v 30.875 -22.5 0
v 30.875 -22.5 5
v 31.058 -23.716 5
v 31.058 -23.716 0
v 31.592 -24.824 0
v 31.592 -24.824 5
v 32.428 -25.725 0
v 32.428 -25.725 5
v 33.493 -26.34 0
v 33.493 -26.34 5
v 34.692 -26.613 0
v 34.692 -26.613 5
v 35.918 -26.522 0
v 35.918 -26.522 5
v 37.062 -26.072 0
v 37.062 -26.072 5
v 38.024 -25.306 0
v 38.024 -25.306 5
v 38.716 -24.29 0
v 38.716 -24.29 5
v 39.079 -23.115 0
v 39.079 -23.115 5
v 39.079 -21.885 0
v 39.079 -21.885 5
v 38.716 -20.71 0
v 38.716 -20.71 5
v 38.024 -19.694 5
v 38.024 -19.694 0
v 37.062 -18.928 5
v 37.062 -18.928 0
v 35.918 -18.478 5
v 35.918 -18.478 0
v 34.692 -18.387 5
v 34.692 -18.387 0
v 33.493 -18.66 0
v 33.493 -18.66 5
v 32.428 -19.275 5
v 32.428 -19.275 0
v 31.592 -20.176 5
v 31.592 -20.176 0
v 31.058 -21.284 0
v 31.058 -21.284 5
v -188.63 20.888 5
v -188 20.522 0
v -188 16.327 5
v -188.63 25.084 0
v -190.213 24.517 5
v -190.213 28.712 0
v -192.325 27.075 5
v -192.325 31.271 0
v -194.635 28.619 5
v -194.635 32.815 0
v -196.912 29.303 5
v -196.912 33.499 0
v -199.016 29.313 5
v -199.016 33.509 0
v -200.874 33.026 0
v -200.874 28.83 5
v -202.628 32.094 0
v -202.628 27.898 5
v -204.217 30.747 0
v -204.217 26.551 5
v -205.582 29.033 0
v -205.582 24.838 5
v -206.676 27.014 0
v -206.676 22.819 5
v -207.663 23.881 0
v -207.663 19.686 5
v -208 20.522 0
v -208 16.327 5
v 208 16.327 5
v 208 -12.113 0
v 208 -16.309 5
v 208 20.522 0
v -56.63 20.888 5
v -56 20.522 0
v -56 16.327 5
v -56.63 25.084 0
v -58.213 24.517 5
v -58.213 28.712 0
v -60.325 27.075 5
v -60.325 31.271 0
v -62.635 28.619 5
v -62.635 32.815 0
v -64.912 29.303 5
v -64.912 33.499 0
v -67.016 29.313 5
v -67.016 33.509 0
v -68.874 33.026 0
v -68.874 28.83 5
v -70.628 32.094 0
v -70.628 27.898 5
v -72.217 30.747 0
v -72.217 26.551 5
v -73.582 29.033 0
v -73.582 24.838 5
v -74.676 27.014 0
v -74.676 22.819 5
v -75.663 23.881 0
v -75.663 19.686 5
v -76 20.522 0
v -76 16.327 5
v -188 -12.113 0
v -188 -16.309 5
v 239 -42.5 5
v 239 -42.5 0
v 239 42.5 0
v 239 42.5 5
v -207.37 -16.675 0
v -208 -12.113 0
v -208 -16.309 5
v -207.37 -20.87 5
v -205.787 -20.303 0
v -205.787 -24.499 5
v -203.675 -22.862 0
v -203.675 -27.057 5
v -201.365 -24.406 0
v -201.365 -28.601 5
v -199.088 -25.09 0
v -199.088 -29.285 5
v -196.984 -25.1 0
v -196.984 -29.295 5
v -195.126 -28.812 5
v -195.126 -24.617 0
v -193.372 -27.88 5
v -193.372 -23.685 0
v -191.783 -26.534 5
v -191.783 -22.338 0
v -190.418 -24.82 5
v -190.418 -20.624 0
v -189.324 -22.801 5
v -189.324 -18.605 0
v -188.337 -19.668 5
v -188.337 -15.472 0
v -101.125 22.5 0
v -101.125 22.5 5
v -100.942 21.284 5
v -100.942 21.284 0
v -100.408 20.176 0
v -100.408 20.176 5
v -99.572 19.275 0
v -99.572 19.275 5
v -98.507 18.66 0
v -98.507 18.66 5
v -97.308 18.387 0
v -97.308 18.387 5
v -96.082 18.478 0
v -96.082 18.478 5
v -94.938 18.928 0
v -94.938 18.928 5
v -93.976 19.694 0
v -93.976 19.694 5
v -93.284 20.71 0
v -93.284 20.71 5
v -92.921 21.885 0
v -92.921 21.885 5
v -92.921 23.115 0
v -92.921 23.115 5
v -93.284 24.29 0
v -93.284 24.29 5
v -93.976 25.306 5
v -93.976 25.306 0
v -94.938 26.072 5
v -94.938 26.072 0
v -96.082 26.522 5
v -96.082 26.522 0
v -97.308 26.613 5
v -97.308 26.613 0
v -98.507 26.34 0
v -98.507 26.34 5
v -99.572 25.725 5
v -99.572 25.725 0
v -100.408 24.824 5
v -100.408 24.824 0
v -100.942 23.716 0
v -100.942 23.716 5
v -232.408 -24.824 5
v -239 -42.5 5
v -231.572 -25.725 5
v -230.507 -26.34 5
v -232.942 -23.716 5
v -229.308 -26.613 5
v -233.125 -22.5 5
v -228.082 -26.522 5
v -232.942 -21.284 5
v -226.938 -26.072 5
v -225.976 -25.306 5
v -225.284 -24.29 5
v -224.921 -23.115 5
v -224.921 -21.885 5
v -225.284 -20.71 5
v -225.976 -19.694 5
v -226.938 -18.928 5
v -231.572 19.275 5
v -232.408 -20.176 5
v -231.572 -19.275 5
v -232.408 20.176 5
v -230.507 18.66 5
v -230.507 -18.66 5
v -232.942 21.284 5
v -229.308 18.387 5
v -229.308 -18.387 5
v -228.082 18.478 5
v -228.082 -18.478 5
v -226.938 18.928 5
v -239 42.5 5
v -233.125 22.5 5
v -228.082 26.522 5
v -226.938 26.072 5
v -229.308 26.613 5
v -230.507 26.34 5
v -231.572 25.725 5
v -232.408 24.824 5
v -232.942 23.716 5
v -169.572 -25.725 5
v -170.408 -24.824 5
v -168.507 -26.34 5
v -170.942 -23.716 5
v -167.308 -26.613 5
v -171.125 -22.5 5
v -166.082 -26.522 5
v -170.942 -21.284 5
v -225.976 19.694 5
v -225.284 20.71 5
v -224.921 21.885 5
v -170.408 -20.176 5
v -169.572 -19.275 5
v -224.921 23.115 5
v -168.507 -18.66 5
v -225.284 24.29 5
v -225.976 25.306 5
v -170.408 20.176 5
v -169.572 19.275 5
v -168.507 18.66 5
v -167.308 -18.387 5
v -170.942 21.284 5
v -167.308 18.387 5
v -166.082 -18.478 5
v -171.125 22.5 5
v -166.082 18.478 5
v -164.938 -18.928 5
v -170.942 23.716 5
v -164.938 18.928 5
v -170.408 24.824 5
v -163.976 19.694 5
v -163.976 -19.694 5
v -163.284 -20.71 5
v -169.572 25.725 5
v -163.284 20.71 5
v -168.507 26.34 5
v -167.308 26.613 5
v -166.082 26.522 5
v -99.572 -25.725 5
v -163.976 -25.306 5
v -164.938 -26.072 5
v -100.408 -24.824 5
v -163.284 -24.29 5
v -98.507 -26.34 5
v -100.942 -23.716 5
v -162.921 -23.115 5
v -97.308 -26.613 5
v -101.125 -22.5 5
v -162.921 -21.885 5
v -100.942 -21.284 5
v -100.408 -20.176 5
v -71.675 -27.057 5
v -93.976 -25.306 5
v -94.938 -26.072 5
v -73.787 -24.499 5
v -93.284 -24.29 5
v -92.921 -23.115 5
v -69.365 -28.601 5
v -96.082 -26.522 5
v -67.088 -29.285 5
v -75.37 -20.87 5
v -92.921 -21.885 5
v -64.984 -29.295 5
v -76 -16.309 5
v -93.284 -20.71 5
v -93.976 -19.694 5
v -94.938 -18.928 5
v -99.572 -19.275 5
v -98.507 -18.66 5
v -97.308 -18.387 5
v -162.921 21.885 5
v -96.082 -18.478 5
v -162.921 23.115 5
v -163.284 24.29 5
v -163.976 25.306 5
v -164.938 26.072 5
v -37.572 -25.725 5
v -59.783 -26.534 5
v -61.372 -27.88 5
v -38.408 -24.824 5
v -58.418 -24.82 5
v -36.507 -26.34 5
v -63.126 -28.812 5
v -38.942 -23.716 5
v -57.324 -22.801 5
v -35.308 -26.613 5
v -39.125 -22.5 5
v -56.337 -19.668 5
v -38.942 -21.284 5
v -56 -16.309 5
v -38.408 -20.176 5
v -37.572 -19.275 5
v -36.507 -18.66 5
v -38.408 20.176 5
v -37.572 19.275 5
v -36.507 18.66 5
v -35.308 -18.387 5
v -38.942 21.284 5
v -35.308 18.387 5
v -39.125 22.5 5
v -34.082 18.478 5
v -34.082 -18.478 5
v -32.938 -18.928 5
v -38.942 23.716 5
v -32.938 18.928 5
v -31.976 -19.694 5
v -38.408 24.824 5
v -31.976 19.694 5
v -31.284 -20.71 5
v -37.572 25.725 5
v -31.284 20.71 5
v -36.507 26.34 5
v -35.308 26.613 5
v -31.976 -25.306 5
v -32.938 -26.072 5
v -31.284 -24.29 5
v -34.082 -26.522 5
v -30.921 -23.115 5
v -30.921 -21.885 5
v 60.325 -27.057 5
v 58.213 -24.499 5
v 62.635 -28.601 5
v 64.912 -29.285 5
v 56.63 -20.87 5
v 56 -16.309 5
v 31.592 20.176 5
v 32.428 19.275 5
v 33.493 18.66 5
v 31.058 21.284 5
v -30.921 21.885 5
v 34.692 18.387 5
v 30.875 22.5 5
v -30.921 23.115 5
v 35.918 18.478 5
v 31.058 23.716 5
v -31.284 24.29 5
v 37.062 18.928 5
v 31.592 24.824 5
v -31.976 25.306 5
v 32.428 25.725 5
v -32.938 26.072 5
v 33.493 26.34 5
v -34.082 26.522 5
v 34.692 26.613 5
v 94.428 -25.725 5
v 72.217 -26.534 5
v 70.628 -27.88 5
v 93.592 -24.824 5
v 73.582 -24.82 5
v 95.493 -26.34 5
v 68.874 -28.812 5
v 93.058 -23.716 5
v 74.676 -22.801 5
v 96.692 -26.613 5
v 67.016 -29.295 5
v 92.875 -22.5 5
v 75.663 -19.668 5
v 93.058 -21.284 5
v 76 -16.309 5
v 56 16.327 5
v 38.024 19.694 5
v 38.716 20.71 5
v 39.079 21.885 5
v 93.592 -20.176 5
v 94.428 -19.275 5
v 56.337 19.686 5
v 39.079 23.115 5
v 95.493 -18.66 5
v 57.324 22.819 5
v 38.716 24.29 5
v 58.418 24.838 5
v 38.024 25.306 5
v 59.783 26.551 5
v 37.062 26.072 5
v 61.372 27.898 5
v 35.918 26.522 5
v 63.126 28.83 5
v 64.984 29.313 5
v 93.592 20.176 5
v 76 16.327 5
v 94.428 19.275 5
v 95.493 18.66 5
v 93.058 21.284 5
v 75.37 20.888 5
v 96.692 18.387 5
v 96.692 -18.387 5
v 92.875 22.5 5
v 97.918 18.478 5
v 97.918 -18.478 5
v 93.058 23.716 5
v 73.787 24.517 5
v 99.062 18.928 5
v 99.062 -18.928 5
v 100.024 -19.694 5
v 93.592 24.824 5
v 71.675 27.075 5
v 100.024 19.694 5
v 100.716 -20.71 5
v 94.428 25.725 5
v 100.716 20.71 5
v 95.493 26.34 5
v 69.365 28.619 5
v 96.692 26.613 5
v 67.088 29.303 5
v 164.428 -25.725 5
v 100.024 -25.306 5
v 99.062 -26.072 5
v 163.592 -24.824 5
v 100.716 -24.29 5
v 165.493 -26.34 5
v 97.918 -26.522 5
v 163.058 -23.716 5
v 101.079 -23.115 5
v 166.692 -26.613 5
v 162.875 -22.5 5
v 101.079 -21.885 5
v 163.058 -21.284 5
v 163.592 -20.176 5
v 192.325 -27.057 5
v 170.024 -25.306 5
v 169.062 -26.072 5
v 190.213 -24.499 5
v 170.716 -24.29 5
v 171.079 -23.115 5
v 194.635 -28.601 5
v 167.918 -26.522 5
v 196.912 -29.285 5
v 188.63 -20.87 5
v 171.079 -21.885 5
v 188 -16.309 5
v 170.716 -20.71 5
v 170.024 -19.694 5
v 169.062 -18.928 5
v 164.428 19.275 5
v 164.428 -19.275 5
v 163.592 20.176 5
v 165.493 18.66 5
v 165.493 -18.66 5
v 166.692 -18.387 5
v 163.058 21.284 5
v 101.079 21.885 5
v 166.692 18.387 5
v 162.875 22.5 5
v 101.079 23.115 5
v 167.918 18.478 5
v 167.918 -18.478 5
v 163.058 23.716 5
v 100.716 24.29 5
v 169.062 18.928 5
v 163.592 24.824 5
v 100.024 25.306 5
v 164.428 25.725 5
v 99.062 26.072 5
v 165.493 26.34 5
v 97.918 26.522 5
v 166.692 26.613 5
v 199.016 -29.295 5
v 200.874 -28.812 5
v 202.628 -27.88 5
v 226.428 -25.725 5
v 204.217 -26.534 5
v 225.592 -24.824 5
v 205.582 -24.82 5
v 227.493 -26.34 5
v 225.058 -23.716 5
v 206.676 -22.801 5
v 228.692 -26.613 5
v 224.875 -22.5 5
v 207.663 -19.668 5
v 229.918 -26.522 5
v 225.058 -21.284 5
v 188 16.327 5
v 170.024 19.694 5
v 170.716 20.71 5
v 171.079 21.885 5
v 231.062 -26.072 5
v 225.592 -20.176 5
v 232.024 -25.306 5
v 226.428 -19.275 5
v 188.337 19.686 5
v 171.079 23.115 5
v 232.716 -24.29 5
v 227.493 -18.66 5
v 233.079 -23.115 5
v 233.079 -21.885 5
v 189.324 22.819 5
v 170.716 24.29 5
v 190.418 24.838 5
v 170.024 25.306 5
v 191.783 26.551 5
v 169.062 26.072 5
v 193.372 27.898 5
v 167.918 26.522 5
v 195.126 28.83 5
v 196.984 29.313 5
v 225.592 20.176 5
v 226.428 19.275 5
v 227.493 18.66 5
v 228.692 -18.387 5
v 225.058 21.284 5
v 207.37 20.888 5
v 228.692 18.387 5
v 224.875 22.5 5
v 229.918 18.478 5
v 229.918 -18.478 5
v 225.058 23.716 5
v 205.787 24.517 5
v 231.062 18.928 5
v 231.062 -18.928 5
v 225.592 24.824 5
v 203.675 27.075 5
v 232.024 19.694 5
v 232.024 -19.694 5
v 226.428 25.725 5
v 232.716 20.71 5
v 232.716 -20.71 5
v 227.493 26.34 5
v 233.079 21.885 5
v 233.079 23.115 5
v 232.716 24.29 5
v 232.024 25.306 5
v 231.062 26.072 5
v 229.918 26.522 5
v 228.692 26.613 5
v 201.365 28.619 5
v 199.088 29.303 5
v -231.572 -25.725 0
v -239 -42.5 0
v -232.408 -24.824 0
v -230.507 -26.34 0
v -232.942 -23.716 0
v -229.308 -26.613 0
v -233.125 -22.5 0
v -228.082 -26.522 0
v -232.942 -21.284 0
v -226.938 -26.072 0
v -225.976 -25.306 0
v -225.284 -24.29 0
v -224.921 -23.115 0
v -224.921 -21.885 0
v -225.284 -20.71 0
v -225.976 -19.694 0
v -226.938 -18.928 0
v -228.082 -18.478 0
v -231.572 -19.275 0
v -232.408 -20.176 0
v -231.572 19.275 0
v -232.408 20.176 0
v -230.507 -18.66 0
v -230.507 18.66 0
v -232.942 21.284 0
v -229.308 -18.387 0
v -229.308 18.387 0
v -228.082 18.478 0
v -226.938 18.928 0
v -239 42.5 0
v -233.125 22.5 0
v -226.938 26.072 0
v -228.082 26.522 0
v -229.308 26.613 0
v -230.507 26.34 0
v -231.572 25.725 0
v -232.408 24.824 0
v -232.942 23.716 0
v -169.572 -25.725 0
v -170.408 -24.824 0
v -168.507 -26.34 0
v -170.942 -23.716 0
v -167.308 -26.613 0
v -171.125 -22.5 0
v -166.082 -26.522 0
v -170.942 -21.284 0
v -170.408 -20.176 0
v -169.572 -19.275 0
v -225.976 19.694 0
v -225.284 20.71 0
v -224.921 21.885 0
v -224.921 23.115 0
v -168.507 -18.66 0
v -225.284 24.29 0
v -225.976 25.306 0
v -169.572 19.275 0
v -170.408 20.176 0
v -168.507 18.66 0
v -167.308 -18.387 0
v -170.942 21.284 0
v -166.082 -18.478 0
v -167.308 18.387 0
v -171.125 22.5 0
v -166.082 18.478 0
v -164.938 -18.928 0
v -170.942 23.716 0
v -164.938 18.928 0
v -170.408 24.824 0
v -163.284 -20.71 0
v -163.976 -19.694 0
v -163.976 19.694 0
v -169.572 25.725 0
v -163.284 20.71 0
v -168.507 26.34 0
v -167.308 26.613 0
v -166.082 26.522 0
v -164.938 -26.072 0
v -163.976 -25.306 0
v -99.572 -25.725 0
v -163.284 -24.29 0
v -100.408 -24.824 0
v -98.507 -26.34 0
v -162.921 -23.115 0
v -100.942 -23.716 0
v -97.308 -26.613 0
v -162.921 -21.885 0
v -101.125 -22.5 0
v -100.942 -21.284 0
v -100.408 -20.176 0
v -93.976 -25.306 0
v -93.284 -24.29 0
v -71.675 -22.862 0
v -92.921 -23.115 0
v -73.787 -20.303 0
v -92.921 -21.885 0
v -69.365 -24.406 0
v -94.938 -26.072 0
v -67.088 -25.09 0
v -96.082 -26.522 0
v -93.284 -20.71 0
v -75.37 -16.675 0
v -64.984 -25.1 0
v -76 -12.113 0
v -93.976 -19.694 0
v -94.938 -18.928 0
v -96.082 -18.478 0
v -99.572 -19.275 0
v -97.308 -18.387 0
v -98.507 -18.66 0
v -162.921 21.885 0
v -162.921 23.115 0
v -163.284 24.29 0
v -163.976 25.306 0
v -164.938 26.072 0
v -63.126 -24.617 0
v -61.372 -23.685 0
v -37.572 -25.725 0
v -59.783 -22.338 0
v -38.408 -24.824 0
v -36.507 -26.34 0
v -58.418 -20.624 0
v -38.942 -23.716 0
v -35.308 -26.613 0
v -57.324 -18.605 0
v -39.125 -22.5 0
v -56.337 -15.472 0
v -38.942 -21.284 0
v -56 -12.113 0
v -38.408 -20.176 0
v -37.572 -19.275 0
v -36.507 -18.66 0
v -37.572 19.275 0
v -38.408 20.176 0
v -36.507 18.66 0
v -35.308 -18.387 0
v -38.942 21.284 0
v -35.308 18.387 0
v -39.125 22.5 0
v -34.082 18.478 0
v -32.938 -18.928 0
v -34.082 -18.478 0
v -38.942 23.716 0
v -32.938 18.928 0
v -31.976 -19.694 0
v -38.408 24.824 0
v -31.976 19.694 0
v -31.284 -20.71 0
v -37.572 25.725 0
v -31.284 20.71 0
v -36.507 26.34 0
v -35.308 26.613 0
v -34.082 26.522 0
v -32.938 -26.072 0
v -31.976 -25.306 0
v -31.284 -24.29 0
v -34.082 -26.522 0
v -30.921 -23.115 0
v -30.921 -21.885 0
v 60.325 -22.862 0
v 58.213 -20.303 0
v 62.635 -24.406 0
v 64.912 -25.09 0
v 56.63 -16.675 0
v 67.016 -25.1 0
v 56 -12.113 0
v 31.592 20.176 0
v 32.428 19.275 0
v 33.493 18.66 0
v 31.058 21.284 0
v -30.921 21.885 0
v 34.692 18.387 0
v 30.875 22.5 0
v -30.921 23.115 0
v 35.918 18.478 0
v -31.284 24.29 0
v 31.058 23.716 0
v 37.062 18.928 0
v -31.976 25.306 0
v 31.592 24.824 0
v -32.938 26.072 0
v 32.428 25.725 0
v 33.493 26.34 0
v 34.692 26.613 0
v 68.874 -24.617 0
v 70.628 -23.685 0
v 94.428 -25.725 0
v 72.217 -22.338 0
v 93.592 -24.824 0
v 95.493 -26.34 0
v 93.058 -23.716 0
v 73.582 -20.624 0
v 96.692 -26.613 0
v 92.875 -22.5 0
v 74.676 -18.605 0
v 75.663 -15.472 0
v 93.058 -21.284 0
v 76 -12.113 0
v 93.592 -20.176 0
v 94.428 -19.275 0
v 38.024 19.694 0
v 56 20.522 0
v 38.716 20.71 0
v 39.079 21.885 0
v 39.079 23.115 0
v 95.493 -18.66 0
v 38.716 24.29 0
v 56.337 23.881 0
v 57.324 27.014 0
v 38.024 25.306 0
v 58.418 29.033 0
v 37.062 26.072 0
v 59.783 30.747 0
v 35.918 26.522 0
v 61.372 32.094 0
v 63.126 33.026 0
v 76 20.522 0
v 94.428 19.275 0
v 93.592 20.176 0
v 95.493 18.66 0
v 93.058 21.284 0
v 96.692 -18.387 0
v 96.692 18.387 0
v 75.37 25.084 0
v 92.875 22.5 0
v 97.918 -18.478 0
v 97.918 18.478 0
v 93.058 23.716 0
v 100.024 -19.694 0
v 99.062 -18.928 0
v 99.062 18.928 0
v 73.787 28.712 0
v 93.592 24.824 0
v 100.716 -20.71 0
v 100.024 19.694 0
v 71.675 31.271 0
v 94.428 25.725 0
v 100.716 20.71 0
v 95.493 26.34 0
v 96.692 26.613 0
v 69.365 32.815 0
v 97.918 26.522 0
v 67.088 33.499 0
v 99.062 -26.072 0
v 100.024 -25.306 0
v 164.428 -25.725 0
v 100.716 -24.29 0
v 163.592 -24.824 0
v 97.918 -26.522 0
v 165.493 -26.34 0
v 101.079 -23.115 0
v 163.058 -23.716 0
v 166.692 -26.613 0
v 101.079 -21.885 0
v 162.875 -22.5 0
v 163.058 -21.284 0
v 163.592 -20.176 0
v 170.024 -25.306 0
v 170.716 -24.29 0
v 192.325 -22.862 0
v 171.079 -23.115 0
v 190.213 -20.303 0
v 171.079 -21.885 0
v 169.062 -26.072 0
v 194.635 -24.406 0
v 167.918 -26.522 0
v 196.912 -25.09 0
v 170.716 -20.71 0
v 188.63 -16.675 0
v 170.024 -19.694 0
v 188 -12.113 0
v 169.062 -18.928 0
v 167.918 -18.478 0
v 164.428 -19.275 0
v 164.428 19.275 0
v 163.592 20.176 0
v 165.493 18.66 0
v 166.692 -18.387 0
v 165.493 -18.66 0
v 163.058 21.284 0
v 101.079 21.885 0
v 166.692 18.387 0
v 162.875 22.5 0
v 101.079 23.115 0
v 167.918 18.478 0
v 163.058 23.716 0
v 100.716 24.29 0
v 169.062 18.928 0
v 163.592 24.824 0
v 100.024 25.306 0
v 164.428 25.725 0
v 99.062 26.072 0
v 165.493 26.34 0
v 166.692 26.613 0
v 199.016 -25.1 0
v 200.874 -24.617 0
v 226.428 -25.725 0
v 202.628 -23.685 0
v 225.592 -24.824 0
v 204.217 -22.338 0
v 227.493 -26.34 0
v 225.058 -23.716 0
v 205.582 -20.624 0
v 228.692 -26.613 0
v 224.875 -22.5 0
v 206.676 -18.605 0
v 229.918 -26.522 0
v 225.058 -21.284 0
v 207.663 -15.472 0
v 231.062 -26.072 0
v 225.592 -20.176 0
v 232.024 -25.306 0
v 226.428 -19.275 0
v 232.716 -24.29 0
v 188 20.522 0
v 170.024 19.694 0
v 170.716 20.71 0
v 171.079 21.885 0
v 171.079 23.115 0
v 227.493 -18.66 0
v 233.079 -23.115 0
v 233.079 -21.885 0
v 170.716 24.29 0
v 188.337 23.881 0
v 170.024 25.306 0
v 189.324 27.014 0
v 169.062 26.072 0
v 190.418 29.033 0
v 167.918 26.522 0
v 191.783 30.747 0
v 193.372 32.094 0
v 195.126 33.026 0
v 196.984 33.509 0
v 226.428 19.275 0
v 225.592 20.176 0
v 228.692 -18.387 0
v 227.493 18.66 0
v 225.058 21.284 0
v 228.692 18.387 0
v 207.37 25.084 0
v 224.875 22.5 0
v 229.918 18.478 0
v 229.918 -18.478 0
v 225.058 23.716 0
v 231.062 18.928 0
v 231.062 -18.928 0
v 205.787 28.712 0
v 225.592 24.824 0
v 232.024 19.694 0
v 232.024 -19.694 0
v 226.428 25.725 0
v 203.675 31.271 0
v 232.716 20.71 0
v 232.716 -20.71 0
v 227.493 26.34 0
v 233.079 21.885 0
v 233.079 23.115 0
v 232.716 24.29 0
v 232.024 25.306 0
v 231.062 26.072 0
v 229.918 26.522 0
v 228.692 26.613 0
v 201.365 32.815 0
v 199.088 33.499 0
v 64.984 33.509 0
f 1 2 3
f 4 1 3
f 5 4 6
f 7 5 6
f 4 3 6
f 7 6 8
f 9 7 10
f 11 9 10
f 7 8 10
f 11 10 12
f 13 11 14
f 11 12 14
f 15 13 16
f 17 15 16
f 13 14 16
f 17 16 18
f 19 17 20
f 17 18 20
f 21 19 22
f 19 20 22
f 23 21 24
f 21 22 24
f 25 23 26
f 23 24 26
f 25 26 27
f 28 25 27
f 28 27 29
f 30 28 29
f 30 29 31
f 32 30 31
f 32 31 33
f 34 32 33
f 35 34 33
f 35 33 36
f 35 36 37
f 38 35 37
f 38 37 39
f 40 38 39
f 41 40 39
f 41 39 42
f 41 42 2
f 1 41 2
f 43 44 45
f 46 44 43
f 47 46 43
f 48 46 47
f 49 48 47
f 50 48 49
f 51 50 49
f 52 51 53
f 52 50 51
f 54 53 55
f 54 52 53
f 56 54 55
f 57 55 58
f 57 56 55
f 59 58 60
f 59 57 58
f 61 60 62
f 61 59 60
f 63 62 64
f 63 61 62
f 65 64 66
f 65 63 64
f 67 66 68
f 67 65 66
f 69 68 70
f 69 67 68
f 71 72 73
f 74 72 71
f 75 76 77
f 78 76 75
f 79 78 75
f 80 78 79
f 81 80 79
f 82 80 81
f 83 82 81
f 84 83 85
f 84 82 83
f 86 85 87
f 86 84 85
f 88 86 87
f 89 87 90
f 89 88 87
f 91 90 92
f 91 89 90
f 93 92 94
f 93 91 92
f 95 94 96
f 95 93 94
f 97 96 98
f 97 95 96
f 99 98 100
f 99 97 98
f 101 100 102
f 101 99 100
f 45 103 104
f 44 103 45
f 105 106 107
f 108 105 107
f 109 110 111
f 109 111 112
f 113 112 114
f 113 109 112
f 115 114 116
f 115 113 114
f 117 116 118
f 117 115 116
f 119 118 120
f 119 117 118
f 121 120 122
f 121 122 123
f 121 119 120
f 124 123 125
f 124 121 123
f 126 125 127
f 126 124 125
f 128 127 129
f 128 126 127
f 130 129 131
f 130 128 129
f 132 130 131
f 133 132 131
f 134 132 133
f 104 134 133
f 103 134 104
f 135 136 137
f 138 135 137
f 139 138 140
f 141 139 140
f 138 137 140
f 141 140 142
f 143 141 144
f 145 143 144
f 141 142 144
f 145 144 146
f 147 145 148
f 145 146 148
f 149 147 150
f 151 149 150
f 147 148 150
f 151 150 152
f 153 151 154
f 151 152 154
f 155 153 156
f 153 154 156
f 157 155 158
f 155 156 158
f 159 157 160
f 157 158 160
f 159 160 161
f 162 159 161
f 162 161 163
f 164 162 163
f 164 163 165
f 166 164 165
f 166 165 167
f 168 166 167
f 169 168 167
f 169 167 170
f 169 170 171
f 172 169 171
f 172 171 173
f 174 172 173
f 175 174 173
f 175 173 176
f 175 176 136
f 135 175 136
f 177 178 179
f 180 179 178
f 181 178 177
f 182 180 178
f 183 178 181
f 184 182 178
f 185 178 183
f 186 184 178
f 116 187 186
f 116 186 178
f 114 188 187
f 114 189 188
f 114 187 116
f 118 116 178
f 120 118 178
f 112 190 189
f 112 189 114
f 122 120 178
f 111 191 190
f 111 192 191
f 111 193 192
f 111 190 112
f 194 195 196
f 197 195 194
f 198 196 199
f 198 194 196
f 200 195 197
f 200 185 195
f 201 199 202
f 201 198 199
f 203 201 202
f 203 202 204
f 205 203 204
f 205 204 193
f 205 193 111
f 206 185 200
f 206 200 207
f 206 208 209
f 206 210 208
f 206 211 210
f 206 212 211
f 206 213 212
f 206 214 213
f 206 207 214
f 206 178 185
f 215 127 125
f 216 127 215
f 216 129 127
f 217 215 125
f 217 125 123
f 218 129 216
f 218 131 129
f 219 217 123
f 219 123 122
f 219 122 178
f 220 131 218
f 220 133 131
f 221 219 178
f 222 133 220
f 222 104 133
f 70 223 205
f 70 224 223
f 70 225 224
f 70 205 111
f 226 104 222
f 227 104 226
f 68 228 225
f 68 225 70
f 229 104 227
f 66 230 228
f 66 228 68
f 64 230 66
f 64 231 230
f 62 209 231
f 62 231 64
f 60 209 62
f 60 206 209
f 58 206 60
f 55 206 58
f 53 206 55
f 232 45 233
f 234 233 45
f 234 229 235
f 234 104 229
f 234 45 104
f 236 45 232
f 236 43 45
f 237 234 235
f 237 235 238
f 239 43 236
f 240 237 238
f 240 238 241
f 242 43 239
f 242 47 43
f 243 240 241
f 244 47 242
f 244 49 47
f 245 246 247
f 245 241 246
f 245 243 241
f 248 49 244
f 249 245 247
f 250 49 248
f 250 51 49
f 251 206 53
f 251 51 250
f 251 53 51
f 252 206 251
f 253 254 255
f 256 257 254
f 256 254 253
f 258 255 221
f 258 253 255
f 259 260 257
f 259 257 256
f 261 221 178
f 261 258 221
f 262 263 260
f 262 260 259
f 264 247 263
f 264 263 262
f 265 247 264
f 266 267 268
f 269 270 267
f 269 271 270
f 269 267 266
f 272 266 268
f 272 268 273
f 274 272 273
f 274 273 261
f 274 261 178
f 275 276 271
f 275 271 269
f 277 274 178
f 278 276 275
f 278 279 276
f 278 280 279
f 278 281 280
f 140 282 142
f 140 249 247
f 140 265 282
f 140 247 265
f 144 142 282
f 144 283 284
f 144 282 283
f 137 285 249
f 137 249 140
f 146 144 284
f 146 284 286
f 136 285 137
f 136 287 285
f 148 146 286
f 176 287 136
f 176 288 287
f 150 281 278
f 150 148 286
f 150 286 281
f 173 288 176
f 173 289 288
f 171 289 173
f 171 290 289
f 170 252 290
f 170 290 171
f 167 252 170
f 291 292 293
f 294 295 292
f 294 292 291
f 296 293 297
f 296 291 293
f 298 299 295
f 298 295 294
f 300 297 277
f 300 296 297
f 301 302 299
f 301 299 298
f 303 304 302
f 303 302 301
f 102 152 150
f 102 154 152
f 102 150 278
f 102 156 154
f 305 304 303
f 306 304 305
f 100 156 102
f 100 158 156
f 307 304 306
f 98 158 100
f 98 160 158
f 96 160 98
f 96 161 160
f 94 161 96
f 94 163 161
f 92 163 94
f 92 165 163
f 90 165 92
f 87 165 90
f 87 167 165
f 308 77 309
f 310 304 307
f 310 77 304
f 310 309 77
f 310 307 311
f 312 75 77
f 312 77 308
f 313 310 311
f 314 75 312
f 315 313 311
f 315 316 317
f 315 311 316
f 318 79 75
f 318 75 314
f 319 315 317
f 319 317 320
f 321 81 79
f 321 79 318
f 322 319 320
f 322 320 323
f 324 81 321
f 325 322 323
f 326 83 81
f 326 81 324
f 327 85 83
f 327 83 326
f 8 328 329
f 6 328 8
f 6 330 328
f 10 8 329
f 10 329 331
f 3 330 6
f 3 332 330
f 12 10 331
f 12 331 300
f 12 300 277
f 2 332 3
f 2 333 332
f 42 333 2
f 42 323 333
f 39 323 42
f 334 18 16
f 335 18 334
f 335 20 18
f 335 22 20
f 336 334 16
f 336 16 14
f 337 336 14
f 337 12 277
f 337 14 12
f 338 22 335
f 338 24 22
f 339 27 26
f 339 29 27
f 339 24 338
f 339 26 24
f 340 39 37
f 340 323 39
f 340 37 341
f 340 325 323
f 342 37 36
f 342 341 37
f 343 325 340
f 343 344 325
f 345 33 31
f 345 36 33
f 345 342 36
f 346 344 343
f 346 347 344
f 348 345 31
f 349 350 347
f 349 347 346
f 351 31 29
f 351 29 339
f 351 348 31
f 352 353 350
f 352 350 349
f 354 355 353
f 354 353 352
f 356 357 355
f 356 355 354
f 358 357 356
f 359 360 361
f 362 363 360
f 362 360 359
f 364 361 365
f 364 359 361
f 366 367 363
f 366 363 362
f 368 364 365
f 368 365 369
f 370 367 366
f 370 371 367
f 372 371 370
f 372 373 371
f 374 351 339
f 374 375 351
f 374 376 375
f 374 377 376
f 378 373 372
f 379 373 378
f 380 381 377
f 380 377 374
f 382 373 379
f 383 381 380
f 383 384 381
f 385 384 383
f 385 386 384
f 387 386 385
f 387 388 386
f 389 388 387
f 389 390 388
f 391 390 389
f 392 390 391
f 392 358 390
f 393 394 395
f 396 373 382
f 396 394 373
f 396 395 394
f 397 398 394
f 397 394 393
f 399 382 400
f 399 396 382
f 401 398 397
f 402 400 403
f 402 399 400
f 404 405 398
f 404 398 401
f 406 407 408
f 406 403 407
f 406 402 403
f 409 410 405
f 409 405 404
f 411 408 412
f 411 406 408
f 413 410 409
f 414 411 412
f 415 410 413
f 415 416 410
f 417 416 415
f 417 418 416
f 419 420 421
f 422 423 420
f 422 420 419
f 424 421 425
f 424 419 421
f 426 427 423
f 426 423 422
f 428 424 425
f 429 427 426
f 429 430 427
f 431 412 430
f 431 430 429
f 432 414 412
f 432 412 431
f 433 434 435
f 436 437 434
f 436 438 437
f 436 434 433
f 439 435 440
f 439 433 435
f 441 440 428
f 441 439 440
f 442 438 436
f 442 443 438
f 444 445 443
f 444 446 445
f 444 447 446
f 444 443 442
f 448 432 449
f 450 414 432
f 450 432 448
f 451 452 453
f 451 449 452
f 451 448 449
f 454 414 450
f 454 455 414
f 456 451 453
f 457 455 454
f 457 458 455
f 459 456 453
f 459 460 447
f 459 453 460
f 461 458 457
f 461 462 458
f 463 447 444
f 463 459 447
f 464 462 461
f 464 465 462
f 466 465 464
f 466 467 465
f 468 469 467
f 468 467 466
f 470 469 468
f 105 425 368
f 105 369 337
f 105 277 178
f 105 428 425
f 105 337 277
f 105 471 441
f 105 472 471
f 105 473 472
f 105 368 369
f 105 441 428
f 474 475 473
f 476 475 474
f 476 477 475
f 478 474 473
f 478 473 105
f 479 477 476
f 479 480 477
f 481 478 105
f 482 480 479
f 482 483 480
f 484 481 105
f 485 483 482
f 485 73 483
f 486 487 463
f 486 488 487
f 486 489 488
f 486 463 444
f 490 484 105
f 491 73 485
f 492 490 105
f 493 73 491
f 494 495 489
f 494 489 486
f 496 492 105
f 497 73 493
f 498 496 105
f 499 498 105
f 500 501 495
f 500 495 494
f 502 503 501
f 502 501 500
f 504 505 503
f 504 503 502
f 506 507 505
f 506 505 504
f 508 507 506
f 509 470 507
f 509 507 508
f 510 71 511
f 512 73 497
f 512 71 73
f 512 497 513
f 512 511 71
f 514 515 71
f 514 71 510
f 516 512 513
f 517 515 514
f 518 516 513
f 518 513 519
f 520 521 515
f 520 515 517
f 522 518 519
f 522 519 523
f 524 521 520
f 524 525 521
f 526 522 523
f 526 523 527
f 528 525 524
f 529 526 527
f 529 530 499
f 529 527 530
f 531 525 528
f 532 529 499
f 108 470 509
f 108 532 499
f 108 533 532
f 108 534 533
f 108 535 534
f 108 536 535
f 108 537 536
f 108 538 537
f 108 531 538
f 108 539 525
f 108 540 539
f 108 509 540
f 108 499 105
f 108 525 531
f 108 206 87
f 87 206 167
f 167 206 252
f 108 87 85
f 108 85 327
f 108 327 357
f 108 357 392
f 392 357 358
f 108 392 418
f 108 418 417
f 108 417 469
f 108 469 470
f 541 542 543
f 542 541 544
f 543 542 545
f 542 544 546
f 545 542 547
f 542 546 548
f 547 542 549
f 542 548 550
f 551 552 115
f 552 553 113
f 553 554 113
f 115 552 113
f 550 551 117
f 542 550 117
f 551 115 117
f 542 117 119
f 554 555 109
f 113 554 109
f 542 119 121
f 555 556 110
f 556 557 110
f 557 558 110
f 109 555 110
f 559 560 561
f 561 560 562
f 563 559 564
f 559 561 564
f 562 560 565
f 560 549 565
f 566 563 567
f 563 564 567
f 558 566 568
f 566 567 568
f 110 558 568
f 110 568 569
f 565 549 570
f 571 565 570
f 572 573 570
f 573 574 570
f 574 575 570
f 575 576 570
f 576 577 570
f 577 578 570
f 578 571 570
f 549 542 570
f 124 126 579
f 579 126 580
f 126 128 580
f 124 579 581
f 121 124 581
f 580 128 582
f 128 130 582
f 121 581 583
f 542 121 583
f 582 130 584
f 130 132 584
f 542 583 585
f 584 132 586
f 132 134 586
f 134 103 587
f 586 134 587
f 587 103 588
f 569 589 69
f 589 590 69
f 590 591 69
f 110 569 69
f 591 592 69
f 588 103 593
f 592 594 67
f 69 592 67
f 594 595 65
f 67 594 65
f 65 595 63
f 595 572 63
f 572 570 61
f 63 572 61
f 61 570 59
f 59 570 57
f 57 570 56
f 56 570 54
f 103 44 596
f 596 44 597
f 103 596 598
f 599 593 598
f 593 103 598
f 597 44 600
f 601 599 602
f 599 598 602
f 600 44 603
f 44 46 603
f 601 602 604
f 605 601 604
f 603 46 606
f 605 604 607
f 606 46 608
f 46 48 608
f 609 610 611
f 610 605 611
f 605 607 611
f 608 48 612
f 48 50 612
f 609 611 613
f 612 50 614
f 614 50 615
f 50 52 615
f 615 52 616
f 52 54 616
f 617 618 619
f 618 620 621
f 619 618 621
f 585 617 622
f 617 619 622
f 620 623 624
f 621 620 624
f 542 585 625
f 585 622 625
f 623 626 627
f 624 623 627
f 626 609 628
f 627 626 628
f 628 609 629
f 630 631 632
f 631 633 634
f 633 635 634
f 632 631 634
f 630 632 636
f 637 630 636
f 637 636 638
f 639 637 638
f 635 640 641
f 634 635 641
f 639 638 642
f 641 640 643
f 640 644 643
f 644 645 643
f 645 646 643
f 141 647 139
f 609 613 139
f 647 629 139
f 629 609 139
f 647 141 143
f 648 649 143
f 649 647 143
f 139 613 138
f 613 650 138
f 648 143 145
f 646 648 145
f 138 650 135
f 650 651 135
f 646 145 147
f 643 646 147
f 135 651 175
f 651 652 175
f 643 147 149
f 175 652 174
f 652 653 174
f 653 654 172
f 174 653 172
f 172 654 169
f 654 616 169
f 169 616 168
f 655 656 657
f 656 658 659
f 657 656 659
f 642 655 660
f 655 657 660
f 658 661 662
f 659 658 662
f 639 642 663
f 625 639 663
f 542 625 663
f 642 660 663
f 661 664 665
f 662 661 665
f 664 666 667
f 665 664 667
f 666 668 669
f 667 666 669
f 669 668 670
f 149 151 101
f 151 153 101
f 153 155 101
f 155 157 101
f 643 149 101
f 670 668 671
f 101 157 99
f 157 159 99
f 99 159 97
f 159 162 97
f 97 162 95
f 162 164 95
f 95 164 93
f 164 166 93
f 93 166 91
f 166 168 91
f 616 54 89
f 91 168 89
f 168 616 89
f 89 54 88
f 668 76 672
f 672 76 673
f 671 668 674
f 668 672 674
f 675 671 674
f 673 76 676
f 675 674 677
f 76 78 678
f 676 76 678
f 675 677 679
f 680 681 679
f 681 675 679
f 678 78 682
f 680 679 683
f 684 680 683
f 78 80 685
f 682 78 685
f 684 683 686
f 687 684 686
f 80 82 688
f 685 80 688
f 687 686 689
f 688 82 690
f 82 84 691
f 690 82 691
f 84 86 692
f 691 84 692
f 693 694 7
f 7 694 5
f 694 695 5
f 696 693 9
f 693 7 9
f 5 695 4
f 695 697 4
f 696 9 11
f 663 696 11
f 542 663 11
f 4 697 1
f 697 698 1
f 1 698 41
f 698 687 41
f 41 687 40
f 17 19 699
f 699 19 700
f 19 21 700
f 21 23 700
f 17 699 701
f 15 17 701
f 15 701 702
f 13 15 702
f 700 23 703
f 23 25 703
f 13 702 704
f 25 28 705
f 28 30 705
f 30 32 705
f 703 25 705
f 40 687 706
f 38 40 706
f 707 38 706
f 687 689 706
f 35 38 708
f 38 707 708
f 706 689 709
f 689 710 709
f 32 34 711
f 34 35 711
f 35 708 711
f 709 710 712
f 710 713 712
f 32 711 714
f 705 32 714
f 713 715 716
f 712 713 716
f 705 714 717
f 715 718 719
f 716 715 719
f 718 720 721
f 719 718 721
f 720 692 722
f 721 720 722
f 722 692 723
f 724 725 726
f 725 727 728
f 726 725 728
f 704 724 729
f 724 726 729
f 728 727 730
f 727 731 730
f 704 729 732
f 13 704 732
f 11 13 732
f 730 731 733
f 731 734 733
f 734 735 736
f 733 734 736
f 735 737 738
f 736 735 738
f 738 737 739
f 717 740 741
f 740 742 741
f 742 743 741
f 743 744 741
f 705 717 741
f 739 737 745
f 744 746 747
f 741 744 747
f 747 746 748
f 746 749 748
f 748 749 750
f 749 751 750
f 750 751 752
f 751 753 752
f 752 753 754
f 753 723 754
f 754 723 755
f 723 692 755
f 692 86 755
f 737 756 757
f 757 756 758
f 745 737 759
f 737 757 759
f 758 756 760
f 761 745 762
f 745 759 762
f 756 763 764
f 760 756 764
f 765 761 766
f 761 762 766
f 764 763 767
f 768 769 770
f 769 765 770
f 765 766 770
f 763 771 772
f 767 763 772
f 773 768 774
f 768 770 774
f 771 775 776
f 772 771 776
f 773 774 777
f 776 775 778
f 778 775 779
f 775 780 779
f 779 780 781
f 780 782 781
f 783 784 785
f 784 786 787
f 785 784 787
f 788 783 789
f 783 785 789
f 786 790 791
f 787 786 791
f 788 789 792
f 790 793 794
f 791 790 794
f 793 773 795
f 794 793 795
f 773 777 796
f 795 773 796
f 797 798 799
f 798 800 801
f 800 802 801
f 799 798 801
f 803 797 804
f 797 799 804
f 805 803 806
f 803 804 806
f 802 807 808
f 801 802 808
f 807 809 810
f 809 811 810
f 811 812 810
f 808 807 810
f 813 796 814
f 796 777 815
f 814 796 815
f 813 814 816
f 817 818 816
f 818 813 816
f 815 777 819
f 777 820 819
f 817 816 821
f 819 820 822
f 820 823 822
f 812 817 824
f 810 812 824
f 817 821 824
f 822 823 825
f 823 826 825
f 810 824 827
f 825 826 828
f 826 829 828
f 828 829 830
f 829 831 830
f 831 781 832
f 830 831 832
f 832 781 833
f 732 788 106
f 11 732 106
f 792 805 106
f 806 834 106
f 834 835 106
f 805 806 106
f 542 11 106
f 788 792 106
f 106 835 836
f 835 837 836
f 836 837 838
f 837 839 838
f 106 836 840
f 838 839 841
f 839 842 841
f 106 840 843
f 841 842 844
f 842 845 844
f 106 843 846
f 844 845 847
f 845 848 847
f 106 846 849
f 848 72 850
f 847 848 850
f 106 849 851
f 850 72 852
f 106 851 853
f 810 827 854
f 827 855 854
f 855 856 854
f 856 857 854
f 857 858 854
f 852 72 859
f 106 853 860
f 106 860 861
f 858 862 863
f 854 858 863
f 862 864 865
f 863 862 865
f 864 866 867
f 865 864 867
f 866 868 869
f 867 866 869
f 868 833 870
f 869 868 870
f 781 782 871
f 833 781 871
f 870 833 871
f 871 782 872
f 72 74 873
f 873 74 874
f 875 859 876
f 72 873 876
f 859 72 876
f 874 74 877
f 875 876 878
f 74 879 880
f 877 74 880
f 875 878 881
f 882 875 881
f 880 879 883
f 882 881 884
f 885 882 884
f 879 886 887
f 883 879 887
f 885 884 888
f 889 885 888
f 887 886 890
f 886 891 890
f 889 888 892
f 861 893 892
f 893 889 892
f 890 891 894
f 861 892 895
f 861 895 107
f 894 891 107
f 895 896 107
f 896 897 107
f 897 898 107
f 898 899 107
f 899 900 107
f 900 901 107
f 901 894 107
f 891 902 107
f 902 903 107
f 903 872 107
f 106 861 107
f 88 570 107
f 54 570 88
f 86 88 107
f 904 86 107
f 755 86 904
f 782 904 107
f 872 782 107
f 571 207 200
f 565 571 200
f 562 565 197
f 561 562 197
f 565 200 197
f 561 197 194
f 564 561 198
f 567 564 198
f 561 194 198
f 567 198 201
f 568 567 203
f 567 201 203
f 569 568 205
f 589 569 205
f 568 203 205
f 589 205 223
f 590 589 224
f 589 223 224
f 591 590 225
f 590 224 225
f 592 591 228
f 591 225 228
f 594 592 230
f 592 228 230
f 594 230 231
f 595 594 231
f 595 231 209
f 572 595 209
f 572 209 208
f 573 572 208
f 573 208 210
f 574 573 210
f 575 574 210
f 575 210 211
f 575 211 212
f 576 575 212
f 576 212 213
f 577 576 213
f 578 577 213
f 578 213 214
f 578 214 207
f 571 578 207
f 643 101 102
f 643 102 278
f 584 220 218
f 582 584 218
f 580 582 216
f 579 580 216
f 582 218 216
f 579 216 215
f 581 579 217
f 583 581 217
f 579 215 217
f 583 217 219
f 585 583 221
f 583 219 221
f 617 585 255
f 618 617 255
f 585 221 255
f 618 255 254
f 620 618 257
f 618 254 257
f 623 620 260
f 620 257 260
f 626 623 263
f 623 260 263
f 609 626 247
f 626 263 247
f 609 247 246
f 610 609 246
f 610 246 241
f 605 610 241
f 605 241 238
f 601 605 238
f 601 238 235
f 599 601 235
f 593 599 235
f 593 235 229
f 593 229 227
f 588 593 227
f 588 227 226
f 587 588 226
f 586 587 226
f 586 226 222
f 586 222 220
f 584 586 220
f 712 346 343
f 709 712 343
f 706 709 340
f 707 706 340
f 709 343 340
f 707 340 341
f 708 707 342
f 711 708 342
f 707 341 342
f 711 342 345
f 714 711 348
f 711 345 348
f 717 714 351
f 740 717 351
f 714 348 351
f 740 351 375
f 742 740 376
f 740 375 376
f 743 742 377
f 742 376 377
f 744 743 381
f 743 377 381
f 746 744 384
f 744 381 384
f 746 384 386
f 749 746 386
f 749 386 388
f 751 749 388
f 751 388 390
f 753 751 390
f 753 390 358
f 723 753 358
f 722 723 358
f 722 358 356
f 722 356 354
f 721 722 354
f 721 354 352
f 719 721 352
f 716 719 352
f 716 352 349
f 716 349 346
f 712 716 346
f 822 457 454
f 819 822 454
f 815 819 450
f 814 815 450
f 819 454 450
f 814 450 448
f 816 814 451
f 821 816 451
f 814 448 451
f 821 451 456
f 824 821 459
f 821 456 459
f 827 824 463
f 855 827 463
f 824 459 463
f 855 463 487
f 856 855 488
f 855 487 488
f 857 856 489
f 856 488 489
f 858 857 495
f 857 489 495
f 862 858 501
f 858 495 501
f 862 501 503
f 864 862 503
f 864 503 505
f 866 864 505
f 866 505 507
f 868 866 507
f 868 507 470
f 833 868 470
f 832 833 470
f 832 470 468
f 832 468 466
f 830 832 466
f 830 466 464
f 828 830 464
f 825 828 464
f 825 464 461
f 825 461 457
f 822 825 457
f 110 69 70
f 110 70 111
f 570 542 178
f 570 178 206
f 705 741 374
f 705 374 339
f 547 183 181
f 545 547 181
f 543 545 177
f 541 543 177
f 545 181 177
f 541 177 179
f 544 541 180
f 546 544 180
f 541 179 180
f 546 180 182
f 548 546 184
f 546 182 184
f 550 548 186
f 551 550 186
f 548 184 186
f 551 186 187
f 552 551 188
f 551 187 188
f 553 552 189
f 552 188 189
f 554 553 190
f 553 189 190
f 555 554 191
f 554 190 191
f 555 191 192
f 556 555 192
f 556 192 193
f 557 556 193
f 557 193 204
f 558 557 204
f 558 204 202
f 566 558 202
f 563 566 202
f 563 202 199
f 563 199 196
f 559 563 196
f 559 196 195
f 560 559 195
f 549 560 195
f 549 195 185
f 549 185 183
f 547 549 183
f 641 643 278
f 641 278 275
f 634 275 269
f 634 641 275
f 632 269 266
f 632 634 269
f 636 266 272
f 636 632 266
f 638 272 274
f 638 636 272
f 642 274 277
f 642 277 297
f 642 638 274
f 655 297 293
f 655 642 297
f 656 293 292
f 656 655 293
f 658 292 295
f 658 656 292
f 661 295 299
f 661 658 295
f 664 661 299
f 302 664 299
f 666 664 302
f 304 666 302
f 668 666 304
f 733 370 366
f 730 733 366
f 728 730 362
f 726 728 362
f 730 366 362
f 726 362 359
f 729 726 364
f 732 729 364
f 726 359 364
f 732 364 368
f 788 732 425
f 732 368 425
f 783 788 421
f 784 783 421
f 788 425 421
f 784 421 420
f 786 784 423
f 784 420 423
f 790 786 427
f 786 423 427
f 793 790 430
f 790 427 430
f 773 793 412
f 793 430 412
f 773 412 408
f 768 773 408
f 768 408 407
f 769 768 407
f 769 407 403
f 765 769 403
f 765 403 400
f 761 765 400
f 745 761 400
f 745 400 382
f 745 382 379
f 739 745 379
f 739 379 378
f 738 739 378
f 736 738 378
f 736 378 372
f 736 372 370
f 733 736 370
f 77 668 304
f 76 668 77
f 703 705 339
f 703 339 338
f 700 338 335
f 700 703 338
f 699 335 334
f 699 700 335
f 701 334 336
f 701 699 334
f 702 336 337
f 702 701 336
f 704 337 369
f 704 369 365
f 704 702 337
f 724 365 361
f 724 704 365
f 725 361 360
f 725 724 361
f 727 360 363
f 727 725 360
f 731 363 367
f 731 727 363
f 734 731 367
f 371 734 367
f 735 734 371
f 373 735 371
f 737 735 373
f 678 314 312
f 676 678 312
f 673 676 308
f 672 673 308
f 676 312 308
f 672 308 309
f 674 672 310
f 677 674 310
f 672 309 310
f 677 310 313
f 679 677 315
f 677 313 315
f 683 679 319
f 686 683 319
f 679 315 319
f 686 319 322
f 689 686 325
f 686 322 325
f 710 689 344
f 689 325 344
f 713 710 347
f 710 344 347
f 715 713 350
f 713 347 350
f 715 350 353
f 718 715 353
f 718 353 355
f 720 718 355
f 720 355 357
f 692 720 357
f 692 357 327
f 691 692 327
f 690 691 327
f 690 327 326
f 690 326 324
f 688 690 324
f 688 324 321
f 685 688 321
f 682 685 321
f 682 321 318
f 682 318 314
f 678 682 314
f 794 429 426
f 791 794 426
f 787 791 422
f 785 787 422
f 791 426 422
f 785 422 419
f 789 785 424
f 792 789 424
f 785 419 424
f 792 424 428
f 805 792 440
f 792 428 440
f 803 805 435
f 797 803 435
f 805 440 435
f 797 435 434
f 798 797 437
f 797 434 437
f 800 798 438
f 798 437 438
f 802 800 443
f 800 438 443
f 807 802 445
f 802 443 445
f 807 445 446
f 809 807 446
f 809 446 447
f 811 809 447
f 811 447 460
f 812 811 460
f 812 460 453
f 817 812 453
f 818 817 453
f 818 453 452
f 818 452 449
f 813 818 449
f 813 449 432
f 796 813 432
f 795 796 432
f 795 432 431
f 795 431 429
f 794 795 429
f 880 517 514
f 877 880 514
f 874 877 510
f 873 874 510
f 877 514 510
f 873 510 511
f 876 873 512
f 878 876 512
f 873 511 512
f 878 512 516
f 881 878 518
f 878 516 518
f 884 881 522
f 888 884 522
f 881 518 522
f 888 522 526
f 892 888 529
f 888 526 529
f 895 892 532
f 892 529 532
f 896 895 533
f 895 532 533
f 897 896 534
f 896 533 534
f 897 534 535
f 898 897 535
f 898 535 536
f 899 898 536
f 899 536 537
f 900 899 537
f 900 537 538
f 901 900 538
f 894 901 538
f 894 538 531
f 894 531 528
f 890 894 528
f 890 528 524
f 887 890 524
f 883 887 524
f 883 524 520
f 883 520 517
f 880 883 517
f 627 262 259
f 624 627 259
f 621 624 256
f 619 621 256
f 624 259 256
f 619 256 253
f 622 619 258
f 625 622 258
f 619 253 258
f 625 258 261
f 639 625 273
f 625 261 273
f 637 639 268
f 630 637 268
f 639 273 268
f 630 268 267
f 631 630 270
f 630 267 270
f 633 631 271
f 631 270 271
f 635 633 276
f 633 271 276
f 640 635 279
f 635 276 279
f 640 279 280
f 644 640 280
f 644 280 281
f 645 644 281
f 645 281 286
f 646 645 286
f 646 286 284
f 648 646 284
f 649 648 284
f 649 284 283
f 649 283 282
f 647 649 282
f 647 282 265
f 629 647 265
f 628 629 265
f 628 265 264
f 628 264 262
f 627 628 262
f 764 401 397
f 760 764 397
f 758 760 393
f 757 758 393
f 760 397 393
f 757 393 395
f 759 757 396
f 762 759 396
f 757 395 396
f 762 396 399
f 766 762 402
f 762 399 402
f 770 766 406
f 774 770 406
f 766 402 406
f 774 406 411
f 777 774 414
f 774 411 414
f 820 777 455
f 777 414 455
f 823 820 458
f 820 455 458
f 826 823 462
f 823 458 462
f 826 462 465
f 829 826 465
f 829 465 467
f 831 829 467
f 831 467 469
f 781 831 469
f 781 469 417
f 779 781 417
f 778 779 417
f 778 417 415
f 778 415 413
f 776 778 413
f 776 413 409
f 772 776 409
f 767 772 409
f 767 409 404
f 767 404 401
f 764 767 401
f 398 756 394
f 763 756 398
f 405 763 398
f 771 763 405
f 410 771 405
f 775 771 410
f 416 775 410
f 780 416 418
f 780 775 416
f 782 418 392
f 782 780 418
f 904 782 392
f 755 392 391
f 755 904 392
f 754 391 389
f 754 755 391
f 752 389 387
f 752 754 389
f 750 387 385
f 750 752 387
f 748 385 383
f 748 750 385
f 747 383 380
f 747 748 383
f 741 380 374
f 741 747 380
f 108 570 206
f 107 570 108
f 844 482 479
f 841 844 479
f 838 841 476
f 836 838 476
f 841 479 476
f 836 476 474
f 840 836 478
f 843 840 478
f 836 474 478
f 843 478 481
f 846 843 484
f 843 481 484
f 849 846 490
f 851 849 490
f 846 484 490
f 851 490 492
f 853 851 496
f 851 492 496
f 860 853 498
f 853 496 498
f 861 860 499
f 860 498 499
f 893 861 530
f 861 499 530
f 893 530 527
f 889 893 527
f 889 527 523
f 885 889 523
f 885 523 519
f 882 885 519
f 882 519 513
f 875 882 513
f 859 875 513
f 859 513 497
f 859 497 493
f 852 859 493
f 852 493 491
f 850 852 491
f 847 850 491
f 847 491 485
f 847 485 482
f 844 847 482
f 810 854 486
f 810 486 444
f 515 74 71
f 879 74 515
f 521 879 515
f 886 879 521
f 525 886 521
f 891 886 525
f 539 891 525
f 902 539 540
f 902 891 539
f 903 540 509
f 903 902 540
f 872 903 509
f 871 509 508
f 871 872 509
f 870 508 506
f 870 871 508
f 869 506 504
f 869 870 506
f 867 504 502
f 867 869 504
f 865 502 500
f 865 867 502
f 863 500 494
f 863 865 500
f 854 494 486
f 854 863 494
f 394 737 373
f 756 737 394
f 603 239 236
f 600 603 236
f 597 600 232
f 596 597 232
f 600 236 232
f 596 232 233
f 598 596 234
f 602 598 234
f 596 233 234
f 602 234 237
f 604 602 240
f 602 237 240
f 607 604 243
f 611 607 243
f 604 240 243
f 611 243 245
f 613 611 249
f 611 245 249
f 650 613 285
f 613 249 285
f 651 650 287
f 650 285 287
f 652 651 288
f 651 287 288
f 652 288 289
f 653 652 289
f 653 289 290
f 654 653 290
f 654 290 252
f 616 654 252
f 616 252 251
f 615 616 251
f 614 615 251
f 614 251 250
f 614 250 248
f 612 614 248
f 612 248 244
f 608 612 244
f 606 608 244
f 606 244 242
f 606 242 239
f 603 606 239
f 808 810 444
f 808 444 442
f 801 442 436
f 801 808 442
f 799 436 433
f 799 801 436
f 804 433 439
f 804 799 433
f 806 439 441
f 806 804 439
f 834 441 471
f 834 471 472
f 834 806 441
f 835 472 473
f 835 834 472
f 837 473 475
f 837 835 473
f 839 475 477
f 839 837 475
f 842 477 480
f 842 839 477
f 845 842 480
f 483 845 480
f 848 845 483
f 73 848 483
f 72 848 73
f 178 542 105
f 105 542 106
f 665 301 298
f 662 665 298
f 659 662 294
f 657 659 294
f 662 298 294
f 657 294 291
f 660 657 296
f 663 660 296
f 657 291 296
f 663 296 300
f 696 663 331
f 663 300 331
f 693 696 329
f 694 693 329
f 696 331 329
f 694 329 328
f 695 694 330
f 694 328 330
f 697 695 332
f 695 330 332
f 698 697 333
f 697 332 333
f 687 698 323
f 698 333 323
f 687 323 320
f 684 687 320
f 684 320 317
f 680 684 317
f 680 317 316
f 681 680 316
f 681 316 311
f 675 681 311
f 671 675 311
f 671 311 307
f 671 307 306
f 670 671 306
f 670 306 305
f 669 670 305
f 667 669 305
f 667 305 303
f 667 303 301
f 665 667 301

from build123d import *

# Parameters (mm, degrees)
F0_W     = 478
F0_H     = 85
F1_DEPTH = 5
F2_D     = 8.25
F5_DEPTH = 54.637947


with BuildPart() as f1:
    # F0 (on Top) → F1 (new body)
    with BuildSketch(Plane.XY):
        Rectangle(F0_W, F0_H)
    extrude(amount=F1_DEPTH)

    # F2 (through all)
    with Locations(Plane(origin=(0, 0, 0), x_dir=(1, 0, 0), z_dir=(0, 0, -1))):
        with Locations((-229, 22.5), (-229, -22.5), (-167, 22.5), (-167, -22.5), (-97, 22.5), (-97, -22.5), (-35, 22.5), (-35, -22.5), (35, 22.5), (35, -22.5), (97, 22.5), (97, -22.5), (167, 22.5), (167, -22.5), (229, 22.5), (229, -22.5)):
            Hole(F2_D / 2)

    # F4 (on face) → F5 (cut, through all)
    with BuildSketch(Plane(origin=(0, 15.097957, -17.993044), x_dir=(1, 0, 0), z_dir=(0, -0.642788, 0.766044))):
        with BuildLine():
            ThreePointArc((188, -9.279173), (198, -19.279173), (208, -9.279173))
            Line((208, -9.279173), (208, 15.720827))
            ThreePointArc((208, 15.720827), (198, 25.720827), (188, 15.720827))
            Line((188, 15.720827), (188, -9.279173))
        make_face()
        with BuildLine():
            Line((56, 15.720827), (56, -9.279173))
            ThreePointArc((56, -9.279173), (66, -19.279173), (76, -9.279173))
            Line((76, -9.279173), (76, 15.720827))
            ThreePointArc((76, 15.720827), (66, 25.720827), (56, 15.720827))
        make_face()
        with BuildLine():
            Line((-76, 15.720827), (-76, -9.279173))
            ThreePointArc((-76, -9.279173), (-66, -19.279173), (-56, -9.279173))
            Line((-56, -9.279173), (-56, 15.720827))
            ThreePointArc((-56, 15.720827), (-66, 25.720827), (-76, 15.720827))
        make_face()
        with BuildLine():
            Line((-208, 15.720827), (-208, -9.279173))
            ThreePointArc((-208, -9.279173), (-198, -19.279173), (-188, -9.279173))
            Line((-188, -9.279173), (-188, 15.720827))
            ThreePointArc((-188, 15.720827), (-198, 25.720827), (-208, 15.720827))
        make_face()
    extrude(amount=F5_DEPTH, mode=Mode.SUBTRACT)


solid = f1.part
